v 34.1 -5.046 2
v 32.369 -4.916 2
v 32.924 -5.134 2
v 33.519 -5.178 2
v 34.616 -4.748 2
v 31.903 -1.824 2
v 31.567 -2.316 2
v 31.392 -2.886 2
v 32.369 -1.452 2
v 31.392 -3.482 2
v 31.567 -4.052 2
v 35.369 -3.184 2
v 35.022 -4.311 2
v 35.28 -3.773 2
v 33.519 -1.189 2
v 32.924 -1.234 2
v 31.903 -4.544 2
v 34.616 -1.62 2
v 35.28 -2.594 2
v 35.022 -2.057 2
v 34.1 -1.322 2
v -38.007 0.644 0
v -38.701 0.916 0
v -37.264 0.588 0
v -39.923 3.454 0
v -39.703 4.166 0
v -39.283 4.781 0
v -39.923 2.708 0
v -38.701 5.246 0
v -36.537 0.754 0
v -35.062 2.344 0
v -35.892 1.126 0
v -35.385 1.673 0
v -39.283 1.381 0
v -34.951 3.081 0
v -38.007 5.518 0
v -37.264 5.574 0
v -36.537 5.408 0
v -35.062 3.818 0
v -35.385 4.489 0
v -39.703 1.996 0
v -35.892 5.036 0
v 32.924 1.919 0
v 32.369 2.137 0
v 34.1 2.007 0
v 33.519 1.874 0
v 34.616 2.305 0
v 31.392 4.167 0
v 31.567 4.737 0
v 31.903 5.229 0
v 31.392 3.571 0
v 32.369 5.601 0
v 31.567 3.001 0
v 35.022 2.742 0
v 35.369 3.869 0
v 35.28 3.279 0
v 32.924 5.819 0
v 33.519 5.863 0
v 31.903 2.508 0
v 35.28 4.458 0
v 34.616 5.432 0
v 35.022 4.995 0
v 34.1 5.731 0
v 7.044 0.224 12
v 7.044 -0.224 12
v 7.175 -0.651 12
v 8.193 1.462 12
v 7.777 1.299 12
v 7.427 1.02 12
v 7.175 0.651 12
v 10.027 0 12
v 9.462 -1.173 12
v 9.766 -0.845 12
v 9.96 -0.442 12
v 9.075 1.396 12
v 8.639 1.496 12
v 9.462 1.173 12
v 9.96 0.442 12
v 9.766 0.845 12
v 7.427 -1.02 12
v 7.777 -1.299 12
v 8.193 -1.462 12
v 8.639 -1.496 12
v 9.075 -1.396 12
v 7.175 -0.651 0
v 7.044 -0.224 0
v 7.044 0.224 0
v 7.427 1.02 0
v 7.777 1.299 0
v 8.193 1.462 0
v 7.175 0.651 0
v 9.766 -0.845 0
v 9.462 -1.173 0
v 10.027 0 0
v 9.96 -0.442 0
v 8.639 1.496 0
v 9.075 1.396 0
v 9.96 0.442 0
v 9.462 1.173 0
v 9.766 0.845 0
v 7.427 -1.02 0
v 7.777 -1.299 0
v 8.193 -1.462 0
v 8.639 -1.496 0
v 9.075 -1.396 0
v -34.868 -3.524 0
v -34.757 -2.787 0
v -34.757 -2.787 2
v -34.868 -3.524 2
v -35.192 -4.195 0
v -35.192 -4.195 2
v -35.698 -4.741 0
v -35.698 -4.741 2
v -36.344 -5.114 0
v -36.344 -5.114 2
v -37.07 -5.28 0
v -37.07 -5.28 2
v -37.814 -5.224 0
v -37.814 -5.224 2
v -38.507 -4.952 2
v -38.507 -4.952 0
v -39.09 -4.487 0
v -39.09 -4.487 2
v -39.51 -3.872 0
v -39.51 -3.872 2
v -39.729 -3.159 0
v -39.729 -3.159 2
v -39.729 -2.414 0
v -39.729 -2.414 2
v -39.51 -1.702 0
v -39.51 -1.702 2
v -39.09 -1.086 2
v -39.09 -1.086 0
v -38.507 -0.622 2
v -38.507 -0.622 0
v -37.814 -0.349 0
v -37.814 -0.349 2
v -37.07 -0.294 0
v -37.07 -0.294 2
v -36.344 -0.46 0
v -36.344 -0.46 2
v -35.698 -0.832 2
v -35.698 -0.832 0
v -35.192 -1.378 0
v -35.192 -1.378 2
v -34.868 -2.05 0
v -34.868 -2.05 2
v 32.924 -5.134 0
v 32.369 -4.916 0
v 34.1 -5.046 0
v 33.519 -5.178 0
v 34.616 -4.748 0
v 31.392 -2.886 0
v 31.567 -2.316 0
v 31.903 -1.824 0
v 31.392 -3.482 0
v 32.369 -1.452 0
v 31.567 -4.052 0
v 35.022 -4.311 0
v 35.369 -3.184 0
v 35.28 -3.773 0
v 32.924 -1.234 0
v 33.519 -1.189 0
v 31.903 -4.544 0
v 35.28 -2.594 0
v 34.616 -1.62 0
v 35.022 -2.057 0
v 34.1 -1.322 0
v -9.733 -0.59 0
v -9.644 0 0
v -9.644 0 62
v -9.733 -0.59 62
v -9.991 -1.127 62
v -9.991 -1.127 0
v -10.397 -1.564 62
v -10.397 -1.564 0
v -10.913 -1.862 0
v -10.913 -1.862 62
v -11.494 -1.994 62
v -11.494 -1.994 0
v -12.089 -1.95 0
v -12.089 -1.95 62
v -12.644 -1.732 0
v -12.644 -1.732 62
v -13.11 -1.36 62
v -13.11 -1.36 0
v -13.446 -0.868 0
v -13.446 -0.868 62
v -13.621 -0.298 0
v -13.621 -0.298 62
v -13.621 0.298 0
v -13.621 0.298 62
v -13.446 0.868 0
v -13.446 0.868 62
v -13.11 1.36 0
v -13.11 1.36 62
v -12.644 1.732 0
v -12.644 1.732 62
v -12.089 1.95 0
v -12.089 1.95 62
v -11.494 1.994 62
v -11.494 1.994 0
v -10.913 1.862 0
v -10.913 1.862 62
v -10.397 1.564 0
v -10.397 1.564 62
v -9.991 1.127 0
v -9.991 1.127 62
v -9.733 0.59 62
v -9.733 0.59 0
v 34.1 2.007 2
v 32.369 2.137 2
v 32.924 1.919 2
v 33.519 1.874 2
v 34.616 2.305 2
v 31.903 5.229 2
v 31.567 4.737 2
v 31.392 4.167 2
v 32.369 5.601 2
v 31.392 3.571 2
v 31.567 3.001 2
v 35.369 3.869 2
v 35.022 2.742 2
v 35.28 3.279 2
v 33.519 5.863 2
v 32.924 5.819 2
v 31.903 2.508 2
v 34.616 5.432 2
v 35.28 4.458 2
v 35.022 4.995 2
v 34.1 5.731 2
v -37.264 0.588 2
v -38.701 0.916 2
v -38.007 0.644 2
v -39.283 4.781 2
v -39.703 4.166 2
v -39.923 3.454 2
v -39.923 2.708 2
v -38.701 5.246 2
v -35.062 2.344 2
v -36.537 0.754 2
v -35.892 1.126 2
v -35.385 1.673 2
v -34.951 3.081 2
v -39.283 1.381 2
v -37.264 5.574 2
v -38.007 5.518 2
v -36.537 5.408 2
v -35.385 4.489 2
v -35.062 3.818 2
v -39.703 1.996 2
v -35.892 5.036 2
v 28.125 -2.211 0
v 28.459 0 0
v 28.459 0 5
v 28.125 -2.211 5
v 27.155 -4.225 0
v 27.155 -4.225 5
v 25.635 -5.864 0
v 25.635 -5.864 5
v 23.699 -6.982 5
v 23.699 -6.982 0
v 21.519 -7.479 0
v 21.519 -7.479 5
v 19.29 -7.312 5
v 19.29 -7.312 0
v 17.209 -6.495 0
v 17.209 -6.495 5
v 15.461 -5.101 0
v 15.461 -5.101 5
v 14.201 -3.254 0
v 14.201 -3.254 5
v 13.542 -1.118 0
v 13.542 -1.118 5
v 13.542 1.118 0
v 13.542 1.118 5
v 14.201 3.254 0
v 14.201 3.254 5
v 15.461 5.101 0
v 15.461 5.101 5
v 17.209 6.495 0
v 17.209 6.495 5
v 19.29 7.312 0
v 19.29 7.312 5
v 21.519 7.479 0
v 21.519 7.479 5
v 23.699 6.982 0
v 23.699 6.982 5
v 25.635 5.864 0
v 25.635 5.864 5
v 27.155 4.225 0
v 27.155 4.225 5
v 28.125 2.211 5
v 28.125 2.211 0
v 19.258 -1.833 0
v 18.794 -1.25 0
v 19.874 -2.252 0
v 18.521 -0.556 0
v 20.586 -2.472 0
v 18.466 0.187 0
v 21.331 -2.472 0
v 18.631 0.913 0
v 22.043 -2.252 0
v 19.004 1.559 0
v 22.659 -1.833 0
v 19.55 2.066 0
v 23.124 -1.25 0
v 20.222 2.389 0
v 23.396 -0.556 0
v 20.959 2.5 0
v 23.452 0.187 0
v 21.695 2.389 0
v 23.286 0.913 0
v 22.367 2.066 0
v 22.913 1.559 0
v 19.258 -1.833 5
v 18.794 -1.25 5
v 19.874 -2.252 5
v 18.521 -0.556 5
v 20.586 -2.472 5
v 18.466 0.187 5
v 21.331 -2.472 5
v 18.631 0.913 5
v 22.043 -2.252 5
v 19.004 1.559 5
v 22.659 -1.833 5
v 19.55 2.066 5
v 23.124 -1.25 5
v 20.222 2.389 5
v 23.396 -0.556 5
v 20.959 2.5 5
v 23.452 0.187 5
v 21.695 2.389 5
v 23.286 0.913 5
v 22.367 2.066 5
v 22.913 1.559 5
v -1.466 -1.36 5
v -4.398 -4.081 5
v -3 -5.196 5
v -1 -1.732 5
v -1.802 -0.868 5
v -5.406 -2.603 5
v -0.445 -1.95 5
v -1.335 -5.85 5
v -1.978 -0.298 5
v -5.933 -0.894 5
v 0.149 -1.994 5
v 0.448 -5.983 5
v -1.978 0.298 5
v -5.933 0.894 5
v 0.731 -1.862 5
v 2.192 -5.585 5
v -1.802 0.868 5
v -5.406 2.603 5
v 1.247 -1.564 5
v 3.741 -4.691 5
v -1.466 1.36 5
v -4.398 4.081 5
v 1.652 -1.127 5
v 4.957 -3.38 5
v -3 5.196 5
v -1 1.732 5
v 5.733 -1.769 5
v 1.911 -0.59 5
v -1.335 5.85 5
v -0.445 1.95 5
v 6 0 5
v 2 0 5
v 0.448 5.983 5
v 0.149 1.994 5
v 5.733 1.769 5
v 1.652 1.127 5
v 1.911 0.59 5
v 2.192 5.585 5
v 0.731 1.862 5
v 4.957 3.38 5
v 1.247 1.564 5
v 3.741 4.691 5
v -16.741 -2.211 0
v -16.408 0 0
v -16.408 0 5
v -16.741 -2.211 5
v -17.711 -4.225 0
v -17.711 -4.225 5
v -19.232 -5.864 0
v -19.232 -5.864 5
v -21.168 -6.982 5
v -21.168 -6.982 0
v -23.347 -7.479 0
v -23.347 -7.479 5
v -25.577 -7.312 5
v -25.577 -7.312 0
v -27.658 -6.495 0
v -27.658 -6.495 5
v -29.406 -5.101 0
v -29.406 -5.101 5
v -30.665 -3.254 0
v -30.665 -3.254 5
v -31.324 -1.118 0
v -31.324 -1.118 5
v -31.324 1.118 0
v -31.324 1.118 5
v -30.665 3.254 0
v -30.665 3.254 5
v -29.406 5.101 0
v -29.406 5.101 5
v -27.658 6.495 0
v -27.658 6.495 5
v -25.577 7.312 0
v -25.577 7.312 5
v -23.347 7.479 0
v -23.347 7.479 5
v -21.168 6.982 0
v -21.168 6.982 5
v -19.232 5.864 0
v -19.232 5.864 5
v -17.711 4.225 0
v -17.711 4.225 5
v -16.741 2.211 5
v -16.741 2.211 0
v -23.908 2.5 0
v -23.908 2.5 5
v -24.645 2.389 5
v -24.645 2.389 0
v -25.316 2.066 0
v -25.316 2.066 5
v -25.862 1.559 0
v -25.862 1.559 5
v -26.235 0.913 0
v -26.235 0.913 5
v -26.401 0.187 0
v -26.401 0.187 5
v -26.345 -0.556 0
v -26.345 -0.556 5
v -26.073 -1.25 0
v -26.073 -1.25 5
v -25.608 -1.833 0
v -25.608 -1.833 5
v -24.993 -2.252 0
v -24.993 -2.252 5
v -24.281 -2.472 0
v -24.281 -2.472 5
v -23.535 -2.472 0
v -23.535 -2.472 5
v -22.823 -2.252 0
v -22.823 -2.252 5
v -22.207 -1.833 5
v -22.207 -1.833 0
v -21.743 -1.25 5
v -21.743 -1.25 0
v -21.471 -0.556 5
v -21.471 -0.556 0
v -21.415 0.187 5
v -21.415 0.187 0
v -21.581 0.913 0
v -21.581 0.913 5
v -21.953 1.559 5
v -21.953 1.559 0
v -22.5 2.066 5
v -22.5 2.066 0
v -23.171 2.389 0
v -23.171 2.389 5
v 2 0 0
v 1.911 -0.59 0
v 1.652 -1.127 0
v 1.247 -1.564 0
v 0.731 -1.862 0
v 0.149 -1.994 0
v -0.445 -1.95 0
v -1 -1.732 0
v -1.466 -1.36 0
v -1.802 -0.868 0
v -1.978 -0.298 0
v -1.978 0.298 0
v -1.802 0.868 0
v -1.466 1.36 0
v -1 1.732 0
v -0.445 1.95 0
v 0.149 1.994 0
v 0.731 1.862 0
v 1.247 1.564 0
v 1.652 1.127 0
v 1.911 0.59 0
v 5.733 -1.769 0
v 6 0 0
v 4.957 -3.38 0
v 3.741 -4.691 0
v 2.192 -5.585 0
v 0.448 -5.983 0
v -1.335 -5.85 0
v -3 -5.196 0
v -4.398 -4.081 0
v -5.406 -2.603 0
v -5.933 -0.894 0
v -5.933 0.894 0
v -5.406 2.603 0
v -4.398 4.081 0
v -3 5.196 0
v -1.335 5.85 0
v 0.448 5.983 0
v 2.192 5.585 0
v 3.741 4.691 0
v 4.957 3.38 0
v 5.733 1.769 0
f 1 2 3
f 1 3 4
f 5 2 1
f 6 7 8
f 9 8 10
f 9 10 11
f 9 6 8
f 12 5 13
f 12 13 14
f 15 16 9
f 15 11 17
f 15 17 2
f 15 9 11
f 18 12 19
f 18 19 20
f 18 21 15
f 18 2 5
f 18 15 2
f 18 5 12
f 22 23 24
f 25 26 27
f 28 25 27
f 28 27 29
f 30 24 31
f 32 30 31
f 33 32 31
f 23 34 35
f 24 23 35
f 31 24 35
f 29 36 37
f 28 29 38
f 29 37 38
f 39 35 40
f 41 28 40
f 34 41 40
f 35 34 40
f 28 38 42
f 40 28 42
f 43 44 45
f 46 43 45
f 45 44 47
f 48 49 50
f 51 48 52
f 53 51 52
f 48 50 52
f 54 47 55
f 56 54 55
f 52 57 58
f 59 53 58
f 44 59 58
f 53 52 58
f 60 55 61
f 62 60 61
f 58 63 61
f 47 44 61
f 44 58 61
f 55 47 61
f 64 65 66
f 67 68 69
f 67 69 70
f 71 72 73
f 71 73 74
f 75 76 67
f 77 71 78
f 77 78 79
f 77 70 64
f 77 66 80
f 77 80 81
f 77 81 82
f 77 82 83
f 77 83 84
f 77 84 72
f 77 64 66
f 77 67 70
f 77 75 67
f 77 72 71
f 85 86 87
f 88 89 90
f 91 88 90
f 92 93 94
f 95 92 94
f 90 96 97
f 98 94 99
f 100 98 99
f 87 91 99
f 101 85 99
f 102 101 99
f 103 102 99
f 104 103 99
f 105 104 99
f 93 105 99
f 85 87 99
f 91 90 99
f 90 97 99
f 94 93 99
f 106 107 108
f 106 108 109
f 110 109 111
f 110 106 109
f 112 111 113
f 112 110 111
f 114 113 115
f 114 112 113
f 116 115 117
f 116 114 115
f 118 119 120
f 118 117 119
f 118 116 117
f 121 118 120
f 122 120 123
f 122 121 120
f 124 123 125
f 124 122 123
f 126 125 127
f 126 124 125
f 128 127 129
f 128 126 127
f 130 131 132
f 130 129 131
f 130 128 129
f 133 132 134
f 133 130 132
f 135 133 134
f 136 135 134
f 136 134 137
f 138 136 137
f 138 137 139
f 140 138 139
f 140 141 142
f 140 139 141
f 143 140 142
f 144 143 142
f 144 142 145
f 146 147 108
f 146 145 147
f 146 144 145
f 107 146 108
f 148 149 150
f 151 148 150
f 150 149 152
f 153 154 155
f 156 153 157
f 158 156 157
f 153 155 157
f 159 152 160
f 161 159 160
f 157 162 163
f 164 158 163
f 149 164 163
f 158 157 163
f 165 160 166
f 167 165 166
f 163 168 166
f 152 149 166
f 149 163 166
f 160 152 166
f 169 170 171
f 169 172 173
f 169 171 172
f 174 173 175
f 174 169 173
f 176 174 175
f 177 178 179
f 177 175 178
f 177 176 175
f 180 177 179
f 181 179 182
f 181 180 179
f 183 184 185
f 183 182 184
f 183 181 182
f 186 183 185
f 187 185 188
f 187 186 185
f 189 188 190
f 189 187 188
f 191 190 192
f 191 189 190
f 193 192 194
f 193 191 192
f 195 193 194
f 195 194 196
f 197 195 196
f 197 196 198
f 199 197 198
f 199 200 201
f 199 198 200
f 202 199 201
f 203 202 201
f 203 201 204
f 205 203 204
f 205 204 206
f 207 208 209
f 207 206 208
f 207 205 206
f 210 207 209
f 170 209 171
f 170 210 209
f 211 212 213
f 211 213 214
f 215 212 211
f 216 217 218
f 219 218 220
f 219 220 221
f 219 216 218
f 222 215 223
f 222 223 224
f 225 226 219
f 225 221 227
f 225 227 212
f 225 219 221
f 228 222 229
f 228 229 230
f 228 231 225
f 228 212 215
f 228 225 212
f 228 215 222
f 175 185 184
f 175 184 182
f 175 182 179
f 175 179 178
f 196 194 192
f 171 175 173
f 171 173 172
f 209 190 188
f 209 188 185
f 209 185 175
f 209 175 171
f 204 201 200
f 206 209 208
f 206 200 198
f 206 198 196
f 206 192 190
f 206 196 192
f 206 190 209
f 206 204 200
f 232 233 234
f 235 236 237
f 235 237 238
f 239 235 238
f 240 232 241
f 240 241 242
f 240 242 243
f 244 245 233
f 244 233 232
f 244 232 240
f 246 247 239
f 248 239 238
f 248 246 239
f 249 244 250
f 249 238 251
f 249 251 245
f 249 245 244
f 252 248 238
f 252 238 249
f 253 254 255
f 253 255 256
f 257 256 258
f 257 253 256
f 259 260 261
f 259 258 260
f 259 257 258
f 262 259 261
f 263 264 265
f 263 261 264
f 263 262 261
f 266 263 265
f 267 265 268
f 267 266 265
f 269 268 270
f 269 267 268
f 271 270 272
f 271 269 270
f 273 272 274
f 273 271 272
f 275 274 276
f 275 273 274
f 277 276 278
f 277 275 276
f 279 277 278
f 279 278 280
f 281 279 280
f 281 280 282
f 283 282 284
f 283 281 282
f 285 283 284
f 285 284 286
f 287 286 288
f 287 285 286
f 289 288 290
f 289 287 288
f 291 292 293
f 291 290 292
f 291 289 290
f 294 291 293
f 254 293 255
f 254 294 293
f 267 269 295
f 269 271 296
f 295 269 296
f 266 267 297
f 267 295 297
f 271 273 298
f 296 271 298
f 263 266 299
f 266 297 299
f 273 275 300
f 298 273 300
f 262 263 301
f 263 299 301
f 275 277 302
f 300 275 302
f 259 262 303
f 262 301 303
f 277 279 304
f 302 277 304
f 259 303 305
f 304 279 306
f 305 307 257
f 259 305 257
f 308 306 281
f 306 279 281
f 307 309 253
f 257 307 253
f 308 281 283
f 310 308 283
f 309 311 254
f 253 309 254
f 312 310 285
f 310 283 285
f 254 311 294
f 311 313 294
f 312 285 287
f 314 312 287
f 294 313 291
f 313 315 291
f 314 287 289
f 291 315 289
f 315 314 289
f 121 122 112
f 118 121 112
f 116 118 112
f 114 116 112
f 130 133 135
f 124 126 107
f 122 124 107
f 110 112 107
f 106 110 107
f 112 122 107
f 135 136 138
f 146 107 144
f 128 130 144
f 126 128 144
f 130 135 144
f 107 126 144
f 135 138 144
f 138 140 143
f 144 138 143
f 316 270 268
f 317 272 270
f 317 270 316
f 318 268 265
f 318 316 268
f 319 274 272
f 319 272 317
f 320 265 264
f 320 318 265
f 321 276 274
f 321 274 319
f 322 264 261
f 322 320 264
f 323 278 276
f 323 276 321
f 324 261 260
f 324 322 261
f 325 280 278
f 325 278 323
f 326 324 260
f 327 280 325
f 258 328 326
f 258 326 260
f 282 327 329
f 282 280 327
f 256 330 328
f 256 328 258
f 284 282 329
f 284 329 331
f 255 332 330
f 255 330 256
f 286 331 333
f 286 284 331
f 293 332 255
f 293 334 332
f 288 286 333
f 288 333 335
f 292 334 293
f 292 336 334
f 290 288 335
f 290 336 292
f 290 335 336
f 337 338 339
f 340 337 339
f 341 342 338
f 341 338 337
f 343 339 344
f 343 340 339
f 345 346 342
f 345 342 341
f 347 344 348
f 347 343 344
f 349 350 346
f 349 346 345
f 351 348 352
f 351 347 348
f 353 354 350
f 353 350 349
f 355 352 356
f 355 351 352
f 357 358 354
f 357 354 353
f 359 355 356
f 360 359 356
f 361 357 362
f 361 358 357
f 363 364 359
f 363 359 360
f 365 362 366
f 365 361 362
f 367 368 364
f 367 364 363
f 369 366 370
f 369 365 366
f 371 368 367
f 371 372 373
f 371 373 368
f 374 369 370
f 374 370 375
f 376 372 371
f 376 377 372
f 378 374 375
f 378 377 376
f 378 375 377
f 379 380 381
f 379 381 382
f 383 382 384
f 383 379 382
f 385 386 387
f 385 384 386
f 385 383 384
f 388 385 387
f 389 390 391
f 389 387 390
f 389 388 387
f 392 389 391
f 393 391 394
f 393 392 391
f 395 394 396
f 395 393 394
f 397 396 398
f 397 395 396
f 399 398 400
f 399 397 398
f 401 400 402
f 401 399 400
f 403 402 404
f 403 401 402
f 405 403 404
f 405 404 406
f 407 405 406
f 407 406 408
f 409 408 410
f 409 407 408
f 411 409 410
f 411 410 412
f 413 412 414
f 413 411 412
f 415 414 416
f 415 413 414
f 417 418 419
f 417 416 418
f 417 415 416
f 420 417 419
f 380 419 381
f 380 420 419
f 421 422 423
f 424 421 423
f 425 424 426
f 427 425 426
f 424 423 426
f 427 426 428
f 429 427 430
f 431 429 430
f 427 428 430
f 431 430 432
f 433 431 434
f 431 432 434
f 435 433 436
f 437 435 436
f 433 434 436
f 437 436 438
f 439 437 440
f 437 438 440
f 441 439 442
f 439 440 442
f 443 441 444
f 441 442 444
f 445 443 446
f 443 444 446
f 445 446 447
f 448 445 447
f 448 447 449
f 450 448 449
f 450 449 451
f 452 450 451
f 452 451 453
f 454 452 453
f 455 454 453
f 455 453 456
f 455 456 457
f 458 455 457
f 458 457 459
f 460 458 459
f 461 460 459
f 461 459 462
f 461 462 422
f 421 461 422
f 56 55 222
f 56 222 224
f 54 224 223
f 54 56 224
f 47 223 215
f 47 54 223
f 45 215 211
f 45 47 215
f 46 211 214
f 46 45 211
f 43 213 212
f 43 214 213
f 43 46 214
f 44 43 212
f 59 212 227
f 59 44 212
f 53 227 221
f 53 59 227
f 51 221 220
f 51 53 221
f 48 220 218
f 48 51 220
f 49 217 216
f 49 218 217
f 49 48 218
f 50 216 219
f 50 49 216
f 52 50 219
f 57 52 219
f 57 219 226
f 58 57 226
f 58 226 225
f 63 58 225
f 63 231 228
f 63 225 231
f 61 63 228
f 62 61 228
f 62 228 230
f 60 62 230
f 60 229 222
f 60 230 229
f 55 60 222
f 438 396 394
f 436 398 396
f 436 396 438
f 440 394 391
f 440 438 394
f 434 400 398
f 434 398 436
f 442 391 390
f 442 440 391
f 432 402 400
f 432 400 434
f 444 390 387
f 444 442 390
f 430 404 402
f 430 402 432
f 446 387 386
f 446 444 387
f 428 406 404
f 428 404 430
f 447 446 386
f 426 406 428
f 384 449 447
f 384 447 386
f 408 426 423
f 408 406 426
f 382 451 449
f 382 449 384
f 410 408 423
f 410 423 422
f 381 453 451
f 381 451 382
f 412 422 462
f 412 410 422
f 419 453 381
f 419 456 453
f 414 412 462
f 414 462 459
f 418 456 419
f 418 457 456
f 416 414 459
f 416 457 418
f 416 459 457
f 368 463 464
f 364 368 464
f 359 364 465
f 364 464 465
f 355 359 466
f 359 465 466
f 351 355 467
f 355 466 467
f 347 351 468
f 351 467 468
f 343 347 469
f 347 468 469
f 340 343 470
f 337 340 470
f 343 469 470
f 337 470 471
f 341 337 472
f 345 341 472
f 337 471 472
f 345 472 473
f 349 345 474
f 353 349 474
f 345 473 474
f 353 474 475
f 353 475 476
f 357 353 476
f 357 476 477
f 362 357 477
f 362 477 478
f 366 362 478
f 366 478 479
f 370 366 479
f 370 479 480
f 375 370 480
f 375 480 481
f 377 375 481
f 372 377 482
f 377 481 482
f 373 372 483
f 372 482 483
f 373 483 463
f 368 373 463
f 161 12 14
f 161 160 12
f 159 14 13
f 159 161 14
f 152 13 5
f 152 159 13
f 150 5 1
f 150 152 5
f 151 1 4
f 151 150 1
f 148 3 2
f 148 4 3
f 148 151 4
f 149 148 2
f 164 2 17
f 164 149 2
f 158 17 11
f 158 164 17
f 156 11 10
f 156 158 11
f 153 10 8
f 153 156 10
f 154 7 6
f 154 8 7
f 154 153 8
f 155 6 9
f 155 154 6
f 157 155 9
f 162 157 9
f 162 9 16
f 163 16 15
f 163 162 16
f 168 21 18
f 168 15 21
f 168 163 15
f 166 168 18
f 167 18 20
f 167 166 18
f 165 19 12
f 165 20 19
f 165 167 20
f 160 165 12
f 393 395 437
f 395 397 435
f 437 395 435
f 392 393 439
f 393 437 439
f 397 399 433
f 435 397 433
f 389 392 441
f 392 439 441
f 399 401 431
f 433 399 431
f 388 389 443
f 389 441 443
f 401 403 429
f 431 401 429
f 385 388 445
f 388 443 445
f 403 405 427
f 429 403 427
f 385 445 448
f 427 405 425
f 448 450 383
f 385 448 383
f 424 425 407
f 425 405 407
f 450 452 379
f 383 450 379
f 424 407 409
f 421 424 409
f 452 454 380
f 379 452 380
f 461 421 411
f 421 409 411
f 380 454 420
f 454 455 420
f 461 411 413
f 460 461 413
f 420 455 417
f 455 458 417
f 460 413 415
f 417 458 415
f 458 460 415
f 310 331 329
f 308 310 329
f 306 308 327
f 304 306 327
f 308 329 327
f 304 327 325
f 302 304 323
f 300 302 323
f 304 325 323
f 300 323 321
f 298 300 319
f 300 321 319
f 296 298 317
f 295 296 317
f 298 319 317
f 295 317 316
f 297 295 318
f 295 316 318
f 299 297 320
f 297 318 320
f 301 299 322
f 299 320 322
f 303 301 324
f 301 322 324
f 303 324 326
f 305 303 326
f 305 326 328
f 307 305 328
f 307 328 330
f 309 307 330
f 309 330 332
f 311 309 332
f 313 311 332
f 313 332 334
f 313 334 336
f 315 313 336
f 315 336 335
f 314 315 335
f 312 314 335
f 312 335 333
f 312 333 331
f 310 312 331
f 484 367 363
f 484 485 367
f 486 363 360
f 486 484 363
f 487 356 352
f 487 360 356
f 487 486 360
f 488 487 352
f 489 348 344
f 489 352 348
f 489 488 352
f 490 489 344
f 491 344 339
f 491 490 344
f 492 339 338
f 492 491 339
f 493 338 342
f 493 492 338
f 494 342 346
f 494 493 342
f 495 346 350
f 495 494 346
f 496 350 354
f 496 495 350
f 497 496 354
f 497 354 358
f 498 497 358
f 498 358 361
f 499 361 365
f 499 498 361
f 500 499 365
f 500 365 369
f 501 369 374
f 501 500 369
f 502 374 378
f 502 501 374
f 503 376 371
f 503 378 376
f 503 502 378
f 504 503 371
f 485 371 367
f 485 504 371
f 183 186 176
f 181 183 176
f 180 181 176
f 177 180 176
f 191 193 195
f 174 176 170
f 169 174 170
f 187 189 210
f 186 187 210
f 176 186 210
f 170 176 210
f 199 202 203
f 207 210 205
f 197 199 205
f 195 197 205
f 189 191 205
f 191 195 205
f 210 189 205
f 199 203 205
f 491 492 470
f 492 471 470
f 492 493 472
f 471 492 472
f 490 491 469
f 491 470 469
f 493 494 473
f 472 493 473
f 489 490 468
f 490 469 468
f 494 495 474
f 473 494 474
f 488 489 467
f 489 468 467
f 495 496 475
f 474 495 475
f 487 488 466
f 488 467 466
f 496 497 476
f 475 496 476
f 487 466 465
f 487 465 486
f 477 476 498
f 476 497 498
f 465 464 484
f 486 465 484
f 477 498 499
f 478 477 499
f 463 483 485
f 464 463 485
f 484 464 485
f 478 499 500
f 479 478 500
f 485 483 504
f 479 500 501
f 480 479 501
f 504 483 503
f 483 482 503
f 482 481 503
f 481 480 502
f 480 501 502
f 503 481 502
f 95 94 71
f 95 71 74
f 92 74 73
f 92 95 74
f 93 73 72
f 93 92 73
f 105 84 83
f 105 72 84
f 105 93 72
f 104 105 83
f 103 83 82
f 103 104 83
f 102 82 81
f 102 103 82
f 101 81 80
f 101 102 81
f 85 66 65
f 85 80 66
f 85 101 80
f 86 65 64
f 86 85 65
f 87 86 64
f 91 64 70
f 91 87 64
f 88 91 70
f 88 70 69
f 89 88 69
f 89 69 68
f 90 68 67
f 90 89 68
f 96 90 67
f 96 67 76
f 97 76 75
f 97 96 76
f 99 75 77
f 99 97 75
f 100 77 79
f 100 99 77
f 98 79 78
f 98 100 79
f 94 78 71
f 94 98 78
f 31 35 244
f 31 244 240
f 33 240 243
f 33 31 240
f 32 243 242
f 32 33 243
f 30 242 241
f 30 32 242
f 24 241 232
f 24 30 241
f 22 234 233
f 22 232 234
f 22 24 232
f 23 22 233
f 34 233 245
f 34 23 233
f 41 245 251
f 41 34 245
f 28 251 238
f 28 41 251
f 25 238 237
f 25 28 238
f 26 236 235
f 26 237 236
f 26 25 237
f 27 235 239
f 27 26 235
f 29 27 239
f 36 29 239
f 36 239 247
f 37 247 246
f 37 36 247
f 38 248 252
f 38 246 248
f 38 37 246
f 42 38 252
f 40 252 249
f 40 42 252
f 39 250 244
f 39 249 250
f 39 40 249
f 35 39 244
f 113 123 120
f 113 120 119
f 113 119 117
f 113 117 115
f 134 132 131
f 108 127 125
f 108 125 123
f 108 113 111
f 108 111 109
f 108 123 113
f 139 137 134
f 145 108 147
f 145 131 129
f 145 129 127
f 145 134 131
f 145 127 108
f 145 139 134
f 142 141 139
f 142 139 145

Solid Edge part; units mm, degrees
sketch "Sketch1" plane through (0, 0, 0) normal (0, 0, 1) x (1, 0, 0)
  circle A0 centre (0, 0) radius 6
extrude "Protrusion1" add sketch "Sketch1" along normal blind 5
sketch "Sketch2" plane through (0, 0, 0) normal (0, 0, 1) x (1, 0, 0)
  circle A0 centre (0, 0) radius 2
extrude "ExtrudedCutout_2" cut sketch "Sketch2" along normal mid plane 27.6135
sketch "Sketch3" plane through (0, 0, 0) normal (0, 0, 1) x (1, 0, 0)
  circle A0 centre (-11.6437, 0) radius 2
extrude "ExtrudedProtrusion_6" add sketch "Sketch3" along normal blind 62
sketch "Sketch4" plane through (0, 0, 0) normal (0, 0, 1) x (1, 0, 0)
  circle A0 centre (20.9586, 0) radius 7.5
extrude "ExtrudedProtrusion_7" add sketch "Sketch4" along normal blind 5
sketch "Sketch5" plane through (0, 0, 0) normal (0, 0, 1) x (1, 0, 0)
  circle A0 centre (-23.9079, 0) radius 7.5
extrude "ExtrudedProtrusion_8" add sketch "Sketch5" along normal blind 5
sketch "Sketch6" plane through (20.9586, 0, 5) normal (0, 0, 1) x (0, 1, 0)
  circle A0 centre (0, 44.8665) radius 2.5
  circle A1 centre (0, 0) radius 2.5
extrude "ExtrudedCutout_3" cut sketch "Sketch6" along normal mid plane 41.7834
sketch "Sketch7" plane through (0, 0, 0) normal (0, 0, 1) x (1, 0, 0)
  circle A0 centre (8.5269, 0) radius 1.5
extrude "ExtrudedProtrusion_9" add sketch "Sketch7" along normal blind 12
sketch "Sketch8" plane through (0, 0, 0) normal (0, 0, 1) x (1, 0, 0)
  circle A0 centre (33.3692, -3.1839) radius 2
  circle A1 centre (33.3692, 3.8688) radius 2
extrude "ExtrudedProtrusion_10" add sketch "Sketch8" along normal blind 2
sketch "Sketch9" plane through (0, 0, 0) normal (0, 0, 1) x (1, 0, 0)
  circle A0 centre (-37.2572, -2.7868) radius 2.5
  circle A1 centre (-37.4507, 3.081) radius 2.5
extrude "ExtrudedProtrusion_11" add sketch "Sketch9" along normal blind 2
